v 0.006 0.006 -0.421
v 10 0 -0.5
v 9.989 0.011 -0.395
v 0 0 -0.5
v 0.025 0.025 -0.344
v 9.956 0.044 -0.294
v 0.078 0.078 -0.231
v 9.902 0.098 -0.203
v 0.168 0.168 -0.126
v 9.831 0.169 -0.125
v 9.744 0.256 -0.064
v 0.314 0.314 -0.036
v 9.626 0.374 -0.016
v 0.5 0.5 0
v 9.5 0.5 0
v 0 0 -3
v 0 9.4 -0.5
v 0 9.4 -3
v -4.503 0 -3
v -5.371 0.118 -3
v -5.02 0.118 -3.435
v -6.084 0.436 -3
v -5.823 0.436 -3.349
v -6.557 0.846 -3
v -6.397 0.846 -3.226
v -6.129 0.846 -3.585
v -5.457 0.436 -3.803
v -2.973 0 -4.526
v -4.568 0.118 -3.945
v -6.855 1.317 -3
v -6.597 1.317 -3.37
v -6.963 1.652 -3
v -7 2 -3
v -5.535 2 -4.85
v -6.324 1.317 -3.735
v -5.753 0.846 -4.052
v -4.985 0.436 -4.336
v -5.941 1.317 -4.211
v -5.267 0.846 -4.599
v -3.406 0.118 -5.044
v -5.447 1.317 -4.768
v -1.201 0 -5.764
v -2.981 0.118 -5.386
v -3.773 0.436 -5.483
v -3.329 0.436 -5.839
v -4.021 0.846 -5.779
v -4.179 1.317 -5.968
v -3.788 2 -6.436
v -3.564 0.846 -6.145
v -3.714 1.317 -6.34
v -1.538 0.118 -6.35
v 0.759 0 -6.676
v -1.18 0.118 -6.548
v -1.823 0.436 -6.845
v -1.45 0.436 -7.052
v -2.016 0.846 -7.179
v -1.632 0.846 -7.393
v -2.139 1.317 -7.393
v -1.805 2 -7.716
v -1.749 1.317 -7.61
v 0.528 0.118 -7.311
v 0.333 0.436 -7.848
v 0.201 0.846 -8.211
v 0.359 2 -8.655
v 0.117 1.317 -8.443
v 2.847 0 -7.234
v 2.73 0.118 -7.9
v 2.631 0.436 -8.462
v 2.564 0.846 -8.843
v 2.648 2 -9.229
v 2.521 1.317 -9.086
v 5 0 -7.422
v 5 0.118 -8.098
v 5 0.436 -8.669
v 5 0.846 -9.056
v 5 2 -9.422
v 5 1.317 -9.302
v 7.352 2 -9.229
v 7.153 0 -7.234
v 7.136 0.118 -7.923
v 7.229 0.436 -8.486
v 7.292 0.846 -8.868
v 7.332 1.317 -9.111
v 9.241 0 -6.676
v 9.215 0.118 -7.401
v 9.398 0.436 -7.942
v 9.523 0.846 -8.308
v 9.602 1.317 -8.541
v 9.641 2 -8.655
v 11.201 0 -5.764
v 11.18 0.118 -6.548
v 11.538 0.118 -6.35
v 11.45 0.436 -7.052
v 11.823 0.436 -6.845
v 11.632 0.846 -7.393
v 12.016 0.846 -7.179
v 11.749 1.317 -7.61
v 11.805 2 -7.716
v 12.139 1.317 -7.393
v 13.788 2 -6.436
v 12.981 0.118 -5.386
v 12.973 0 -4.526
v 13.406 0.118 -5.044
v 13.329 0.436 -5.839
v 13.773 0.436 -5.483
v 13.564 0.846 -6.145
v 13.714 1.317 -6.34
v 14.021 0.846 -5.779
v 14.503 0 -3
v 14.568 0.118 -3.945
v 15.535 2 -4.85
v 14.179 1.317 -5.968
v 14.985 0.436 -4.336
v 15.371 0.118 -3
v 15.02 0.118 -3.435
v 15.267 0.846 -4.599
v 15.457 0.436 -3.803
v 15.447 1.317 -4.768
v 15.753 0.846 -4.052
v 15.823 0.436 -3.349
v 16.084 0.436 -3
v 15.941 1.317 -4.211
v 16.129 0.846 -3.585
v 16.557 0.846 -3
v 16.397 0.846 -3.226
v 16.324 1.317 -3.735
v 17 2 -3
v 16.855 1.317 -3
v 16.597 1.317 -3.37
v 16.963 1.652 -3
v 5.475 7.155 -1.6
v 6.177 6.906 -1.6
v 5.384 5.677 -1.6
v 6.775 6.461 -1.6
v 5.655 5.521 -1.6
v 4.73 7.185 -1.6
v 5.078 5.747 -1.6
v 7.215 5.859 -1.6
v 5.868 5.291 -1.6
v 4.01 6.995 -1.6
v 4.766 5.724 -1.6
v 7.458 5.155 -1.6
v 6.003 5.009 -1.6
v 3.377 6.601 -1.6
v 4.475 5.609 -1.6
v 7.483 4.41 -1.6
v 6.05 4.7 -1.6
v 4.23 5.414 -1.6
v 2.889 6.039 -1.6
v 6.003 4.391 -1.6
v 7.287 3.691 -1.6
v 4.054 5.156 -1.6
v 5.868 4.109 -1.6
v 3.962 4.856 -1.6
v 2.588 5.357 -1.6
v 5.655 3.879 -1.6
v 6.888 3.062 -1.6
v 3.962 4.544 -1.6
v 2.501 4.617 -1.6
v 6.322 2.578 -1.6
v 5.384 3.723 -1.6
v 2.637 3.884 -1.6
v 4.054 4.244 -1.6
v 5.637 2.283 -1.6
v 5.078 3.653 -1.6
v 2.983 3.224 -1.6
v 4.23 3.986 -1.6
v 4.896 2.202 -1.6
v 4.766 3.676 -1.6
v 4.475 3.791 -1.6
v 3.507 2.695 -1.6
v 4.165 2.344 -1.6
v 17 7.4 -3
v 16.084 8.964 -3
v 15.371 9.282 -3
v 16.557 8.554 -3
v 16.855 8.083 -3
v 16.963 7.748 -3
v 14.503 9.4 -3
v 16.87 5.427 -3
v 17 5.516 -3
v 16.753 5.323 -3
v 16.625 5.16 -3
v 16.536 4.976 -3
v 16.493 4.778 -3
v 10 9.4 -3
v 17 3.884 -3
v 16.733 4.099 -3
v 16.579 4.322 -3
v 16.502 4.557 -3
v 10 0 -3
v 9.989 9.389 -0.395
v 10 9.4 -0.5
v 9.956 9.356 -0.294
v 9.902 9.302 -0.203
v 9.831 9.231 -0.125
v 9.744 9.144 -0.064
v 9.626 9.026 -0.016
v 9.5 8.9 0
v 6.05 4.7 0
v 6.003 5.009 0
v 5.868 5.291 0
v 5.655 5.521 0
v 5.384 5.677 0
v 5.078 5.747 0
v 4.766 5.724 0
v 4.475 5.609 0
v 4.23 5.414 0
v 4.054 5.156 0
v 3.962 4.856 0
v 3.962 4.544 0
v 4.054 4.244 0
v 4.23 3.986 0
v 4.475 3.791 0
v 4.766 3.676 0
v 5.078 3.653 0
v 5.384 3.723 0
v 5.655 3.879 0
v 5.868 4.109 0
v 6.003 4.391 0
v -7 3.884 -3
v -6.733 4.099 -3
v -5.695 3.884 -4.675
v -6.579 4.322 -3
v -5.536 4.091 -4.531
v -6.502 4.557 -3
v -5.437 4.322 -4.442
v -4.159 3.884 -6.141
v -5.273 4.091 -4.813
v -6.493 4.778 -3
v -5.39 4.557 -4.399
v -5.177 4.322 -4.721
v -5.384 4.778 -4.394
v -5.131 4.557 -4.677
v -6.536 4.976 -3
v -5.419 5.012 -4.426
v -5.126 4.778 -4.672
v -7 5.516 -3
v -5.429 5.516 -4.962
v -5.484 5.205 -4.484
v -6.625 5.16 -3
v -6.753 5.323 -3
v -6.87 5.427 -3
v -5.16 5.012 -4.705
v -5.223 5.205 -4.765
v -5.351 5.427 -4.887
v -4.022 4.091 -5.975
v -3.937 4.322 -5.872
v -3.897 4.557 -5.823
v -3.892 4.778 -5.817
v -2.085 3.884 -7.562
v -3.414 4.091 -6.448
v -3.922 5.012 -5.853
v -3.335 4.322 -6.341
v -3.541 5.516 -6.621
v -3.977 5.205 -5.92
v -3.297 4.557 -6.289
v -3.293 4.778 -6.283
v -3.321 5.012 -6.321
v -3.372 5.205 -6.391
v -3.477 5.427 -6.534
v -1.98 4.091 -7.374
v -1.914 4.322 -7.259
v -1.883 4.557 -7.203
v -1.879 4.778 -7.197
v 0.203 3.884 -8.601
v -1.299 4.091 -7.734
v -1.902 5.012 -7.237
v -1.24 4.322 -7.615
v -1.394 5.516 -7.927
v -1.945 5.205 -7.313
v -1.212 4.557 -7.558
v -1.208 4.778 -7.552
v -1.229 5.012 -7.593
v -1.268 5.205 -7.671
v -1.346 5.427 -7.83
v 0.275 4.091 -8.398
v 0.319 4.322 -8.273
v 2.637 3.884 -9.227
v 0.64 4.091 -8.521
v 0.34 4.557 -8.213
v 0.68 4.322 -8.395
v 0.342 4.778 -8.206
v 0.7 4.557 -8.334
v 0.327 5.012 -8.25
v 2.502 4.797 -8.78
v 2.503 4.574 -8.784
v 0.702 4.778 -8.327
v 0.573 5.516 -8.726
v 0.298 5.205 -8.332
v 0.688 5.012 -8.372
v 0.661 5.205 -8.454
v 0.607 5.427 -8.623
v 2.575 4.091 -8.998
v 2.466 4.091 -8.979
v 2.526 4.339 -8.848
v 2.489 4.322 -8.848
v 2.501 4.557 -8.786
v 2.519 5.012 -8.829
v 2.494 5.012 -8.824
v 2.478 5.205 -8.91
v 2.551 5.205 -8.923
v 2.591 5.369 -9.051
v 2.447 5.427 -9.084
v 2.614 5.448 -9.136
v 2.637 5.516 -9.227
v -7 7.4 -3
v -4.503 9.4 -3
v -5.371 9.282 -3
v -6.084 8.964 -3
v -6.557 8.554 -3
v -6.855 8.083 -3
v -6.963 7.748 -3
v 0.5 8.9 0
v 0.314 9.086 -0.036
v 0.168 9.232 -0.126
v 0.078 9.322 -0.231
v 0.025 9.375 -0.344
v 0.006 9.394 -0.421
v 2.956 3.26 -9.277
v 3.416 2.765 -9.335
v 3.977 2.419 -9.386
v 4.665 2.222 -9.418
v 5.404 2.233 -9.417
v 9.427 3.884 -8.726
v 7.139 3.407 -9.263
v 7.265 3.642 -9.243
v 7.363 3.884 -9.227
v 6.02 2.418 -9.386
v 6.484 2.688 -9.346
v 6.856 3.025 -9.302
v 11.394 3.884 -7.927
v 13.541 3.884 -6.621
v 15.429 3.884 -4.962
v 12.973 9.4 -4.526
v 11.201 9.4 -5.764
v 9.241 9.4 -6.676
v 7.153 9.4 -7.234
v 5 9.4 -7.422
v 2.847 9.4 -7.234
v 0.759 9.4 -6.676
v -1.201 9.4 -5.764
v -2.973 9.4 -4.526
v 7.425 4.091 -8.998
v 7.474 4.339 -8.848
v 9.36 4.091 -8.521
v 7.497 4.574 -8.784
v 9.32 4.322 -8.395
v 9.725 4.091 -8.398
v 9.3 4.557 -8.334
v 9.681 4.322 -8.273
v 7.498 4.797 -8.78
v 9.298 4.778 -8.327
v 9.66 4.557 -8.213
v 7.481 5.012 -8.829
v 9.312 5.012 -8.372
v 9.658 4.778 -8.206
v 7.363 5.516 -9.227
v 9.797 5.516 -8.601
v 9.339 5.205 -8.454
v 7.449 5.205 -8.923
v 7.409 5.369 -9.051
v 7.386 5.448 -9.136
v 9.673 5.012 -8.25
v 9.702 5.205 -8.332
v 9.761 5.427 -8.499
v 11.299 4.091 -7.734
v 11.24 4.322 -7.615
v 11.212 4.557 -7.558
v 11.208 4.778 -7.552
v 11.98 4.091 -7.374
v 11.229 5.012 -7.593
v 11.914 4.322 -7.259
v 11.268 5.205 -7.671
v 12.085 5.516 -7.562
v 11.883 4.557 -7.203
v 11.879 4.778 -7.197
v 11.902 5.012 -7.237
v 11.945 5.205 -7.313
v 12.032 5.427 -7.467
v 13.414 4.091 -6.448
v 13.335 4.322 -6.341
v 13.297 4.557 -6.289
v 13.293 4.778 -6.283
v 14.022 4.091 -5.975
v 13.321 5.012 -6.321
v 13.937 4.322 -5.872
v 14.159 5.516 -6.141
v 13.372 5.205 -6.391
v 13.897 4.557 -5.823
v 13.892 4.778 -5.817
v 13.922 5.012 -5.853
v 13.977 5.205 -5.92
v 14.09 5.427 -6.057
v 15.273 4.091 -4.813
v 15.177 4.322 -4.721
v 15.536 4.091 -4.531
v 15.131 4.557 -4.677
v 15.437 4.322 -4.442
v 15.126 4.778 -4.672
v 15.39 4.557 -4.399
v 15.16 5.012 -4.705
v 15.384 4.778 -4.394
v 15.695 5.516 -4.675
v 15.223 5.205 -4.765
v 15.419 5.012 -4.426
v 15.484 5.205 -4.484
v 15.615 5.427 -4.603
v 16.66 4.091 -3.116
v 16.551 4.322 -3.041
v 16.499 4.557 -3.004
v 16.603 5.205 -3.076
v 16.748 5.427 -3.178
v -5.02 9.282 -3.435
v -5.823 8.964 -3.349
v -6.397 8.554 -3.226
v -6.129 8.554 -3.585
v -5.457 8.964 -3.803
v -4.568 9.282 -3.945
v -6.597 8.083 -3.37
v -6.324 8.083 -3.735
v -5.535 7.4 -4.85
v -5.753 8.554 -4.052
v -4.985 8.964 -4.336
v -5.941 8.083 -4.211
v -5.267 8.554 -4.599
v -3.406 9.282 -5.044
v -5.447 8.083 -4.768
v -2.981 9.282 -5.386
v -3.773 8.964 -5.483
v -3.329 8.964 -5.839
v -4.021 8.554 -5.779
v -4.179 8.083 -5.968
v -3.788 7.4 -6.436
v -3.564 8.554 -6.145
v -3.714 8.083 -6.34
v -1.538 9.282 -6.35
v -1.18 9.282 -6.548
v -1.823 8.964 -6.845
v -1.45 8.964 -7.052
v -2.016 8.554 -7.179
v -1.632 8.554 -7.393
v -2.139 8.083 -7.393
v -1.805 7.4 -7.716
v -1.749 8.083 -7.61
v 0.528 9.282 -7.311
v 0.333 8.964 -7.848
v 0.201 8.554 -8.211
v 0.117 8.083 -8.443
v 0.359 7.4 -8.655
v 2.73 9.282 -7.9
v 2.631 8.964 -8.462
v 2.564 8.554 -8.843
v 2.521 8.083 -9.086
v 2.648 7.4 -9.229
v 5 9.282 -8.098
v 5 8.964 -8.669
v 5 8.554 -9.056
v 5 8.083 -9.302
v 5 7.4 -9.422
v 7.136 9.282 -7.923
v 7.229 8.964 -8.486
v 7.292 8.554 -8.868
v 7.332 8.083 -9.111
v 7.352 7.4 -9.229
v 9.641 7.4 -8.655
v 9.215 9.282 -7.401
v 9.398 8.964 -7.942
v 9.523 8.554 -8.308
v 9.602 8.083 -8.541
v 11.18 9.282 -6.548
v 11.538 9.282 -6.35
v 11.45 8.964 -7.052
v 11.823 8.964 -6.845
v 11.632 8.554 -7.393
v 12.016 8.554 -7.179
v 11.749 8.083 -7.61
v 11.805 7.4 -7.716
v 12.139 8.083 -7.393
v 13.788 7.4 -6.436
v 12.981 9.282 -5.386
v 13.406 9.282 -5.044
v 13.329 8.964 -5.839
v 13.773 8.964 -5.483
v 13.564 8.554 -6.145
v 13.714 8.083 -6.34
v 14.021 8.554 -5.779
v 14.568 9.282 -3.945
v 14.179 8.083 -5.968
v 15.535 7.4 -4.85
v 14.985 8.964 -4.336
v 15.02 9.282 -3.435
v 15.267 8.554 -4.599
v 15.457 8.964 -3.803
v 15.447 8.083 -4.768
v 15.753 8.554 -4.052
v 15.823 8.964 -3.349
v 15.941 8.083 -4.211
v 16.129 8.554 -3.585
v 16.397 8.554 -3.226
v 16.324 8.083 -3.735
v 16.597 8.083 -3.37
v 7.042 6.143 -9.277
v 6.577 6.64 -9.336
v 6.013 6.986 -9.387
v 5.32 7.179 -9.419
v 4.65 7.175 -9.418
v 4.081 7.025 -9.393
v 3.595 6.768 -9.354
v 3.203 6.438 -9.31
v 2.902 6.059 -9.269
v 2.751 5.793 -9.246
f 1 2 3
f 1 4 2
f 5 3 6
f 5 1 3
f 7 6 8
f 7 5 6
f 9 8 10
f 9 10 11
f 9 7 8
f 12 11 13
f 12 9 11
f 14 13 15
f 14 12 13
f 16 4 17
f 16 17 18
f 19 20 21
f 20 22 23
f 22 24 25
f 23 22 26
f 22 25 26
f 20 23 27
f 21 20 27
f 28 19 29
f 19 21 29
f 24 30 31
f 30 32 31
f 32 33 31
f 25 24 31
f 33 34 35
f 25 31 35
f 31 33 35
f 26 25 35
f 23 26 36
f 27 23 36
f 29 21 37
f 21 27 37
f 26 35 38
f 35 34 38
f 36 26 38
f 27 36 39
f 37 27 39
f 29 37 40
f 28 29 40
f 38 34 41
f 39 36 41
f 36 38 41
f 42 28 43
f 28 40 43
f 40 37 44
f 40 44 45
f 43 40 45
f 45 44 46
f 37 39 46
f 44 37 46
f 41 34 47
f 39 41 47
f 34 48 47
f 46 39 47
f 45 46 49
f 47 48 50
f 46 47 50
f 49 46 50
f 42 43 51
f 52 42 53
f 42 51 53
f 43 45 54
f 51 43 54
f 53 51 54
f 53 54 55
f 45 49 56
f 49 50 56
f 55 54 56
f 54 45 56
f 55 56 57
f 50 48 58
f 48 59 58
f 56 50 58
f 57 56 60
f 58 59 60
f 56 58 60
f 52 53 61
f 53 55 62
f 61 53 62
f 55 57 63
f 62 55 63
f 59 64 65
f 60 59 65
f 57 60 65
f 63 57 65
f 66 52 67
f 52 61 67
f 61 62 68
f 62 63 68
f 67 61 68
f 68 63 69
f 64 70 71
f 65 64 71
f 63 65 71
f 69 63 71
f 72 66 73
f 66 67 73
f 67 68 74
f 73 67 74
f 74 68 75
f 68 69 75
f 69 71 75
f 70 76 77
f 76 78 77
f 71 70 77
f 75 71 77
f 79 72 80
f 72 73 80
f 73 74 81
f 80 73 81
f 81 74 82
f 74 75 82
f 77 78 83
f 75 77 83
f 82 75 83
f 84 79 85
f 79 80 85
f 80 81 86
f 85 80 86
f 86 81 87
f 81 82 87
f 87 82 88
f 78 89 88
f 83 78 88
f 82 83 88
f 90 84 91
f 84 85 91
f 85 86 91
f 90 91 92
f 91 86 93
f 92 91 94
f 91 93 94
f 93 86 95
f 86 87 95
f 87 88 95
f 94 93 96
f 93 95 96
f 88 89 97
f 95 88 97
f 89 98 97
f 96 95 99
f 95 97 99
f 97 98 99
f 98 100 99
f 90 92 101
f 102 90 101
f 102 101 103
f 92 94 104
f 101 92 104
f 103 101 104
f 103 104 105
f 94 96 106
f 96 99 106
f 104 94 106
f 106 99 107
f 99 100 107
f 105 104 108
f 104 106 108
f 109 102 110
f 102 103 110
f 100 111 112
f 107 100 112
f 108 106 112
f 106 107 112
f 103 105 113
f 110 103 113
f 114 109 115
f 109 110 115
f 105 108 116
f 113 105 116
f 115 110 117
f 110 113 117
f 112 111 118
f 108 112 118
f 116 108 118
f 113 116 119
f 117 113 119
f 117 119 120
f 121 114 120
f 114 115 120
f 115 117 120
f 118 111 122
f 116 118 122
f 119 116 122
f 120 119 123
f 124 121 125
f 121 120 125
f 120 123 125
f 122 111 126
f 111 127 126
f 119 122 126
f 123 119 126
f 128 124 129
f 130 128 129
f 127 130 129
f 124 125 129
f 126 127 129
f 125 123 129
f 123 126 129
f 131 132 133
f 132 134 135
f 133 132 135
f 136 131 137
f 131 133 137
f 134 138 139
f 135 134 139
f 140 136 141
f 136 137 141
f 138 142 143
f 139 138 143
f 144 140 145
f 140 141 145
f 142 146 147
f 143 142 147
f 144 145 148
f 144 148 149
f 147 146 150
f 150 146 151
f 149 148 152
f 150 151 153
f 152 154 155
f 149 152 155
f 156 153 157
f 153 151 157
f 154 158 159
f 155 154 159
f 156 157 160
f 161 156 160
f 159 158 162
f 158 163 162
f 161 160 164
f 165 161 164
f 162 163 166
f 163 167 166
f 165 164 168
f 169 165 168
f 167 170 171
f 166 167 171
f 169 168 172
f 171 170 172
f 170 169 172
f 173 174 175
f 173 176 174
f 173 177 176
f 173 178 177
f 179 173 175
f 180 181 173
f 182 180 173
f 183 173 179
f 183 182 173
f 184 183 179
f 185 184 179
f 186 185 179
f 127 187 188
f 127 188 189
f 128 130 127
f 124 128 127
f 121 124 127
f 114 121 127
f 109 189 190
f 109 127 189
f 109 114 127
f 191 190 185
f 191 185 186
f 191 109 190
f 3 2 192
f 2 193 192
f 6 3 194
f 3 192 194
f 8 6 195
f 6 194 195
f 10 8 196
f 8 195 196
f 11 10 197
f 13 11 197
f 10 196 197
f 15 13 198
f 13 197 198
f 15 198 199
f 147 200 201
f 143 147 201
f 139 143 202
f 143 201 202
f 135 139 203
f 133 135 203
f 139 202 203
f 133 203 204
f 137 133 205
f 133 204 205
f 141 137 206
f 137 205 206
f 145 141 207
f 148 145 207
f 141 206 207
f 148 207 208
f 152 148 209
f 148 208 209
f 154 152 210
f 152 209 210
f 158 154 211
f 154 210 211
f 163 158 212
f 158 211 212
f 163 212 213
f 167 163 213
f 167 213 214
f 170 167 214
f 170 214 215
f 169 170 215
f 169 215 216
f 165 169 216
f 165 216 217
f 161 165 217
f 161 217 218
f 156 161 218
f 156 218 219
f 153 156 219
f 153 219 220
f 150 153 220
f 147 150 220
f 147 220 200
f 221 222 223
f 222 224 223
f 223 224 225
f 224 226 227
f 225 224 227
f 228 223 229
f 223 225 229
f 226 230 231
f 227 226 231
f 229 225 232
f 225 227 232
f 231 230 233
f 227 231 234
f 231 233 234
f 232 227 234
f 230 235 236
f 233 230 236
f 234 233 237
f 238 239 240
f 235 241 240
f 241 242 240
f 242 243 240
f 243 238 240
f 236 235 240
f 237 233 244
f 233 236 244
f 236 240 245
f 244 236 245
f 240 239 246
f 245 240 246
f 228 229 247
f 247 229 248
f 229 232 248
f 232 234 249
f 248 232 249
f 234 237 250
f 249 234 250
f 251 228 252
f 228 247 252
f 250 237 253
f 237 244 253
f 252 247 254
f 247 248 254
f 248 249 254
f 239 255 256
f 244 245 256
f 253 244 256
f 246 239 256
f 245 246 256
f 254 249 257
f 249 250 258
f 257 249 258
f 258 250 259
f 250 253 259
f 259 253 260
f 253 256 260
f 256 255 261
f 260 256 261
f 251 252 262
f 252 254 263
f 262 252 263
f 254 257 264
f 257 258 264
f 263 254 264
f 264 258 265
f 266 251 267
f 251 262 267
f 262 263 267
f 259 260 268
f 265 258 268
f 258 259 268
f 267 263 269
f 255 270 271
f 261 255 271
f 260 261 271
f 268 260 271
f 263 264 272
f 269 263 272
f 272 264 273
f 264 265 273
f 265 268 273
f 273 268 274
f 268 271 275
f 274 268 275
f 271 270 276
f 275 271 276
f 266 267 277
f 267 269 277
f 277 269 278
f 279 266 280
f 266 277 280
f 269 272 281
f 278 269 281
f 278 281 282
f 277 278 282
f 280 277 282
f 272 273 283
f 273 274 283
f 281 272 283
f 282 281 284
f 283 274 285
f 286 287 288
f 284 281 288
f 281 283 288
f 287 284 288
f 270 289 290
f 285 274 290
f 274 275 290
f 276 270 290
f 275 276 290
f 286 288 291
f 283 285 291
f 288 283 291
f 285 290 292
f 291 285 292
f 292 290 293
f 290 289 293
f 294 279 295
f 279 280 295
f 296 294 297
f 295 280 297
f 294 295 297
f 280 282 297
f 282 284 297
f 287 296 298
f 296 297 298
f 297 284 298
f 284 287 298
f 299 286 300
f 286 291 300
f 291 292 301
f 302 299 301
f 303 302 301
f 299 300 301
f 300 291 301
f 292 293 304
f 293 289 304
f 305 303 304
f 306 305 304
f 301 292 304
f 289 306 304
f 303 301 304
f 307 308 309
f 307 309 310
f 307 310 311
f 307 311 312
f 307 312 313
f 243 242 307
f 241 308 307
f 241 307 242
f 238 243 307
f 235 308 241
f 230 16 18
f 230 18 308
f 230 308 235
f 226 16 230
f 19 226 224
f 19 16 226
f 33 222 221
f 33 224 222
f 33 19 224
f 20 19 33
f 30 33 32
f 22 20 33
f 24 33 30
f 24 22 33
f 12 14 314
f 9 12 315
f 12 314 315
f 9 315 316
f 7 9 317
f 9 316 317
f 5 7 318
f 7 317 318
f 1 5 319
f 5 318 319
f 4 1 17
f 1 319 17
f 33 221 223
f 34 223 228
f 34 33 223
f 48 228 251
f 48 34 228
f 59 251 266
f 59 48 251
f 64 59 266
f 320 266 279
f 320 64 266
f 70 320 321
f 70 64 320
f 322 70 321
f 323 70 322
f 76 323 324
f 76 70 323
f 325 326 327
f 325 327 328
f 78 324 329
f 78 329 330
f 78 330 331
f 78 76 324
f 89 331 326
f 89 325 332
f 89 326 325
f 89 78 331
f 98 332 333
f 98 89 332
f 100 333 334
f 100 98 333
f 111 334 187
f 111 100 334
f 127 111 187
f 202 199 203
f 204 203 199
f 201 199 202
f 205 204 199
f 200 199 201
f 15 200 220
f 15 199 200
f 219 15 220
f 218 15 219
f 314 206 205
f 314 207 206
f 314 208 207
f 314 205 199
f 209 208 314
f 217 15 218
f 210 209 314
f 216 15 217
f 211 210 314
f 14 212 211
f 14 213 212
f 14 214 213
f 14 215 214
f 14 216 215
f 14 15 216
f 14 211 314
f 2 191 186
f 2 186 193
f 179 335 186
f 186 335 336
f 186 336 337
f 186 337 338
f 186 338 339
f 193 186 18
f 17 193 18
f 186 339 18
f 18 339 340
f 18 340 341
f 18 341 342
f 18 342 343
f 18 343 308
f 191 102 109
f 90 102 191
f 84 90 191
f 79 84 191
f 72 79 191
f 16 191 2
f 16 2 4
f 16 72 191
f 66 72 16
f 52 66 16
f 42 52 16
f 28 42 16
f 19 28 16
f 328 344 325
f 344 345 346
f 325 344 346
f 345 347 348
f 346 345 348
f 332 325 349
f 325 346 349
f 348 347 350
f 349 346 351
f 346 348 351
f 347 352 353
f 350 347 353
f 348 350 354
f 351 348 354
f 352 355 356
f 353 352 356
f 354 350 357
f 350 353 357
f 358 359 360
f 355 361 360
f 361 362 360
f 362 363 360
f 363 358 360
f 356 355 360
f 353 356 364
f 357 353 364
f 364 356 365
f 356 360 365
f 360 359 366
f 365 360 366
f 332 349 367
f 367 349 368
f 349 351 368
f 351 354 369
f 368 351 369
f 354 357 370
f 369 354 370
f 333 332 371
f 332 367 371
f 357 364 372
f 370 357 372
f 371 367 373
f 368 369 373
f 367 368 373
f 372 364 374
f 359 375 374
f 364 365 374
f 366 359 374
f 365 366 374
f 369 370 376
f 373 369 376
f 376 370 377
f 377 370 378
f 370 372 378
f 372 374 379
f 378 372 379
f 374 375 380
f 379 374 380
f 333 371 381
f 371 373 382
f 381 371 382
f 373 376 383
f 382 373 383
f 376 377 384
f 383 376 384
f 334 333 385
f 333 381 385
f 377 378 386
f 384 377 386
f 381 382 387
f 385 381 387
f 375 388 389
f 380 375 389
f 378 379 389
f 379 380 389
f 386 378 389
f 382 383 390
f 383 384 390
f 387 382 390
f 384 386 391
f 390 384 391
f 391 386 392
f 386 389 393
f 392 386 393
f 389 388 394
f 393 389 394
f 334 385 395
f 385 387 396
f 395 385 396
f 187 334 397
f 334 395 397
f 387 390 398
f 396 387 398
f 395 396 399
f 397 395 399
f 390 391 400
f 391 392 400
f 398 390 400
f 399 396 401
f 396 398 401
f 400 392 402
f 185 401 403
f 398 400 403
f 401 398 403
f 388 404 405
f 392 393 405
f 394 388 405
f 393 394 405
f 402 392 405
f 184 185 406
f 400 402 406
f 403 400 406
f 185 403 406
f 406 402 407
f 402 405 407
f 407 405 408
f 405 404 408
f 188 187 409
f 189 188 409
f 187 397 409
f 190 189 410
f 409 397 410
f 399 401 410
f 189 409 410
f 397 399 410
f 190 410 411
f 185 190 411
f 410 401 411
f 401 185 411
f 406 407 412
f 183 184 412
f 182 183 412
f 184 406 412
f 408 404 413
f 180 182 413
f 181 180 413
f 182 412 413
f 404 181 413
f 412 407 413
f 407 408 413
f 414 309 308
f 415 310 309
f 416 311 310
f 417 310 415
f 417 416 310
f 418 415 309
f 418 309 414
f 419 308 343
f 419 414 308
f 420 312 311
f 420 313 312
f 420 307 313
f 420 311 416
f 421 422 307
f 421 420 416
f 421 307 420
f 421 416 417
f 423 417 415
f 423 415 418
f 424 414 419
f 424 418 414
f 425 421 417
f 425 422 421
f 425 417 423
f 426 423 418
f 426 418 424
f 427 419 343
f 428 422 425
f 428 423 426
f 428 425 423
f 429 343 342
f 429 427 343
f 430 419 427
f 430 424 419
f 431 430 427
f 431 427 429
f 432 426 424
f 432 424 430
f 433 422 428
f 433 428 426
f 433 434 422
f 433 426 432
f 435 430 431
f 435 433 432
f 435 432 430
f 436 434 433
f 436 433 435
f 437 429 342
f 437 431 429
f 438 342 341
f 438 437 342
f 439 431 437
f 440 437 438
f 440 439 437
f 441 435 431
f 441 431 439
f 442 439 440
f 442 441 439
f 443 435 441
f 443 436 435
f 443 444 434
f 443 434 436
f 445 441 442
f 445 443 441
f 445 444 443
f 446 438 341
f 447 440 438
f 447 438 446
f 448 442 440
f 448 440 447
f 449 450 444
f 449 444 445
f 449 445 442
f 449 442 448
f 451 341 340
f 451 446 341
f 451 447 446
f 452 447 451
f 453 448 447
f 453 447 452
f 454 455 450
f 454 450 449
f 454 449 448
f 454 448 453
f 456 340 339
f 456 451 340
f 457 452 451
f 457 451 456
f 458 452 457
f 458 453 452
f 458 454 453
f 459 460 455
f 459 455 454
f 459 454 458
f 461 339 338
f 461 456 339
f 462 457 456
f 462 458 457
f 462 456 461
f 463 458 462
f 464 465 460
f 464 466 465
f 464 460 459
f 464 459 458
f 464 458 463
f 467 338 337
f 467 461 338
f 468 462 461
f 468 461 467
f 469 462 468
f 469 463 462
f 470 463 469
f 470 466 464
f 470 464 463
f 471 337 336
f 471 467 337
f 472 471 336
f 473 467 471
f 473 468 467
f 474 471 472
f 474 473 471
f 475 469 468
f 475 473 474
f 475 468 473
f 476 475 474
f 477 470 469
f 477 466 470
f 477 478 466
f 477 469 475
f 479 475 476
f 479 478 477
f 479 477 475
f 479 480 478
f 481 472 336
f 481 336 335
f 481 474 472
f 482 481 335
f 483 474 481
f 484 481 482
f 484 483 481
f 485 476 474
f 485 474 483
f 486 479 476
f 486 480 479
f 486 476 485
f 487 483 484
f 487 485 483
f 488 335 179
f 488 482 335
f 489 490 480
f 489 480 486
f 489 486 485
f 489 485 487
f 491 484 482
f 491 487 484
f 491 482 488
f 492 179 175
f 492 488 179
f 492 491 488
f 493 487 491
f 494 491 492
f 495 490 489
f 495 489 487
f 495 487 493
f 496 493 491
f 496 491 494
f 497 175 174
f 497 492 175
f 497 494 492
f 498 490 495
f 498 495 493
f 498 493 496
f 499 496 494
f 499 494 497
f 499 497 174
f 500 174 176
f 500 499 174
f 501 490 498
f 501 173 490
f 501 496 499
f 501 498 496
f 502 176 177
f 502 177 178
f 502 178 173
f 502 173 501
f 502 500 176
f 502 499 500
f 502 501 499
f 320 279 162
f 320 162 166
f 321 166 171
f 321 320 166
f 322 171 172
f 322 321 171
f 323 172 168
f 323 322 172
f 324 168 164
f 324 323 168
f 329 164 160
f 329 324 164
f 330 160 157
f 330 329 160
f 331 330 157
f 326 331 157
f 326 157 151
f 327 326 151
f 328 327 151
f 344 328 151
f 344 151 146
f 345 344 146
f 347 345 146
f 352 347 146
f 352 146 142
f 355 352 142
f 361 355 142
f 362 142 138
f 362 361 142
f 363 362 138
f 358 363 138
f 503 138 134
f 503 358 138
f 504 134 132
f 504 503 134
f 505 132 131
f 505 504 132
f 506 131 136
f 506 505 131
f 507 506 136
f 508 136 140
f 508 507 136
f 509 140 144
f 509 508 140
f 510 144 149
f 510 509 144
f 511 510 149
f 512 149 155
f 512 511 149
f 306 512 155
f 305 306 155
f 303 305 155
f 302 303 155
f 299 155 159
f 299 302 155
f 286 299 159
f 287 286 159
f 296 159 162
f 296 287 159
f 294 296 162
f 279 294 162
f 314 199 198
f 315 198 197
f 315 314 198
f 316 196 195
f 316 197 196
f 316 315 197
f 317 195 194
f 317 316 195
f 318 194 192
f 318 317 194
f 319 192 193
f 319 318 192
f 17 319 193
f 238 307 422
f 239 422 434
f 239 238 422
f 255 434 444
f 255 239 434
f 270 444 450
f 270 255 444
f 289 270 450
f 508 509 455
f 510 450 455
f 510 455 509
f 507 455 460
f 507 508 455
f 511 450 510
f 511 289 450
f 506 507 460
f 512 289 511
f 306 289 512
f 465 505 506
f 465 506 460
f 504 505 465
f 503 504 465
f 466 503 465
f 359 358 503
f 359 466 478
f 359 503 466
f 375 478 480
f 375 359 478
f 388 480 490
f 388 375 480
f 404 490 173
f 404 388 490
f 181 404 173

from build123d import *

# Parameters (mm, degrees)
BOSS_EXTRU_2_DEPTH      = 9.4
ESQUISSE13_R            = 1
ESQUISSE14_R            = 1.05
ENL_V_MAT_EXTRU_1_DEPTH = 22.590228256
ESQUISSE15_R            = 2.5
ENL_V_MAT_EXTRU_2_DEPTH = 8.4
CONG_2_R                = 0.5
CONG_3_R                = 2


with BuildPart() as part:
    # Esquisse1 → Boss.-Extru.2 (new body)
    with BuildSketch(Plane(origin=(0, 0, 0), x_dir=(1, 0, 0), z_dir=(0, 1, 0))):
        with BuildLine():
            ThreePointArc((-7, 3), (5, 9.422205102), (17, 3))
            Line((17, 3), (10, 3))
            Line((10, 3), (10, 0))
            Line((10, 0), (0, 0))
            Line((0, 0), (0, 3))
            Line((0, 3), (-7, 3))
        make_face()
    extrude(amount=BOSS_EXTRU_2_DEPTH)

    # Esquisse13 → Enlèvement de matière-Révolution4 (revolve, cut)
    with BuildSketch(Plane.XY.offset(5)):
        with Locations((-10, 4.7)):
            Circle(ESQUISSE13_R)
    revolve(axis=Axis((5, 9.4, 5), (0, -1, 0)), mode=Mode.SUBTRACT)

    # Esquisse14 → Enlèv. mat.-Extru.1 (cut, through all)
    with BuildSketch(Plane.XY):
        with Locations((5, 4.7)):
            Circle(ESQUISSE14_R)
    extrude(amount=-ENL_V_MAT_EXTRU_1_DEPTH, mode=Mode.SUBTRACT)

    # Esquisse15 → Enlèv. mat.-Extru.2 (cut)
    with BuildSketch(Plane.XY.offset(-10)):
        with Locations(Location((5, 4.7, 0), (0, 0, 199.054827186))):
            Circle(ESQUISSE15_R)
    extrude(amount=ENL_V_MAT_EXTRU_2_DEPTH, mode=Mode.SUBTRACT)

    # Congé2
    cong_2_edges = [part.edges().sort_by_distance(p)[0] for p in [
        (10, 4.7, 0),
        (0, 4.7, 0),
        (5, 9.4, 0),
        (5, 0, 0),
    ]]
    fillet(cong_2_edges, radius=CONG_2_R)

    # Congé3
    cong_3_edges = [part.edges().sort_by_distance(p)[0] for p in [
        (5, 0, -9.422205102),
        (5, 9.4, -9.422205102),
    ]]
    fillet(cong_3_edges, radius=CONG_3_R)


solid = part.part
